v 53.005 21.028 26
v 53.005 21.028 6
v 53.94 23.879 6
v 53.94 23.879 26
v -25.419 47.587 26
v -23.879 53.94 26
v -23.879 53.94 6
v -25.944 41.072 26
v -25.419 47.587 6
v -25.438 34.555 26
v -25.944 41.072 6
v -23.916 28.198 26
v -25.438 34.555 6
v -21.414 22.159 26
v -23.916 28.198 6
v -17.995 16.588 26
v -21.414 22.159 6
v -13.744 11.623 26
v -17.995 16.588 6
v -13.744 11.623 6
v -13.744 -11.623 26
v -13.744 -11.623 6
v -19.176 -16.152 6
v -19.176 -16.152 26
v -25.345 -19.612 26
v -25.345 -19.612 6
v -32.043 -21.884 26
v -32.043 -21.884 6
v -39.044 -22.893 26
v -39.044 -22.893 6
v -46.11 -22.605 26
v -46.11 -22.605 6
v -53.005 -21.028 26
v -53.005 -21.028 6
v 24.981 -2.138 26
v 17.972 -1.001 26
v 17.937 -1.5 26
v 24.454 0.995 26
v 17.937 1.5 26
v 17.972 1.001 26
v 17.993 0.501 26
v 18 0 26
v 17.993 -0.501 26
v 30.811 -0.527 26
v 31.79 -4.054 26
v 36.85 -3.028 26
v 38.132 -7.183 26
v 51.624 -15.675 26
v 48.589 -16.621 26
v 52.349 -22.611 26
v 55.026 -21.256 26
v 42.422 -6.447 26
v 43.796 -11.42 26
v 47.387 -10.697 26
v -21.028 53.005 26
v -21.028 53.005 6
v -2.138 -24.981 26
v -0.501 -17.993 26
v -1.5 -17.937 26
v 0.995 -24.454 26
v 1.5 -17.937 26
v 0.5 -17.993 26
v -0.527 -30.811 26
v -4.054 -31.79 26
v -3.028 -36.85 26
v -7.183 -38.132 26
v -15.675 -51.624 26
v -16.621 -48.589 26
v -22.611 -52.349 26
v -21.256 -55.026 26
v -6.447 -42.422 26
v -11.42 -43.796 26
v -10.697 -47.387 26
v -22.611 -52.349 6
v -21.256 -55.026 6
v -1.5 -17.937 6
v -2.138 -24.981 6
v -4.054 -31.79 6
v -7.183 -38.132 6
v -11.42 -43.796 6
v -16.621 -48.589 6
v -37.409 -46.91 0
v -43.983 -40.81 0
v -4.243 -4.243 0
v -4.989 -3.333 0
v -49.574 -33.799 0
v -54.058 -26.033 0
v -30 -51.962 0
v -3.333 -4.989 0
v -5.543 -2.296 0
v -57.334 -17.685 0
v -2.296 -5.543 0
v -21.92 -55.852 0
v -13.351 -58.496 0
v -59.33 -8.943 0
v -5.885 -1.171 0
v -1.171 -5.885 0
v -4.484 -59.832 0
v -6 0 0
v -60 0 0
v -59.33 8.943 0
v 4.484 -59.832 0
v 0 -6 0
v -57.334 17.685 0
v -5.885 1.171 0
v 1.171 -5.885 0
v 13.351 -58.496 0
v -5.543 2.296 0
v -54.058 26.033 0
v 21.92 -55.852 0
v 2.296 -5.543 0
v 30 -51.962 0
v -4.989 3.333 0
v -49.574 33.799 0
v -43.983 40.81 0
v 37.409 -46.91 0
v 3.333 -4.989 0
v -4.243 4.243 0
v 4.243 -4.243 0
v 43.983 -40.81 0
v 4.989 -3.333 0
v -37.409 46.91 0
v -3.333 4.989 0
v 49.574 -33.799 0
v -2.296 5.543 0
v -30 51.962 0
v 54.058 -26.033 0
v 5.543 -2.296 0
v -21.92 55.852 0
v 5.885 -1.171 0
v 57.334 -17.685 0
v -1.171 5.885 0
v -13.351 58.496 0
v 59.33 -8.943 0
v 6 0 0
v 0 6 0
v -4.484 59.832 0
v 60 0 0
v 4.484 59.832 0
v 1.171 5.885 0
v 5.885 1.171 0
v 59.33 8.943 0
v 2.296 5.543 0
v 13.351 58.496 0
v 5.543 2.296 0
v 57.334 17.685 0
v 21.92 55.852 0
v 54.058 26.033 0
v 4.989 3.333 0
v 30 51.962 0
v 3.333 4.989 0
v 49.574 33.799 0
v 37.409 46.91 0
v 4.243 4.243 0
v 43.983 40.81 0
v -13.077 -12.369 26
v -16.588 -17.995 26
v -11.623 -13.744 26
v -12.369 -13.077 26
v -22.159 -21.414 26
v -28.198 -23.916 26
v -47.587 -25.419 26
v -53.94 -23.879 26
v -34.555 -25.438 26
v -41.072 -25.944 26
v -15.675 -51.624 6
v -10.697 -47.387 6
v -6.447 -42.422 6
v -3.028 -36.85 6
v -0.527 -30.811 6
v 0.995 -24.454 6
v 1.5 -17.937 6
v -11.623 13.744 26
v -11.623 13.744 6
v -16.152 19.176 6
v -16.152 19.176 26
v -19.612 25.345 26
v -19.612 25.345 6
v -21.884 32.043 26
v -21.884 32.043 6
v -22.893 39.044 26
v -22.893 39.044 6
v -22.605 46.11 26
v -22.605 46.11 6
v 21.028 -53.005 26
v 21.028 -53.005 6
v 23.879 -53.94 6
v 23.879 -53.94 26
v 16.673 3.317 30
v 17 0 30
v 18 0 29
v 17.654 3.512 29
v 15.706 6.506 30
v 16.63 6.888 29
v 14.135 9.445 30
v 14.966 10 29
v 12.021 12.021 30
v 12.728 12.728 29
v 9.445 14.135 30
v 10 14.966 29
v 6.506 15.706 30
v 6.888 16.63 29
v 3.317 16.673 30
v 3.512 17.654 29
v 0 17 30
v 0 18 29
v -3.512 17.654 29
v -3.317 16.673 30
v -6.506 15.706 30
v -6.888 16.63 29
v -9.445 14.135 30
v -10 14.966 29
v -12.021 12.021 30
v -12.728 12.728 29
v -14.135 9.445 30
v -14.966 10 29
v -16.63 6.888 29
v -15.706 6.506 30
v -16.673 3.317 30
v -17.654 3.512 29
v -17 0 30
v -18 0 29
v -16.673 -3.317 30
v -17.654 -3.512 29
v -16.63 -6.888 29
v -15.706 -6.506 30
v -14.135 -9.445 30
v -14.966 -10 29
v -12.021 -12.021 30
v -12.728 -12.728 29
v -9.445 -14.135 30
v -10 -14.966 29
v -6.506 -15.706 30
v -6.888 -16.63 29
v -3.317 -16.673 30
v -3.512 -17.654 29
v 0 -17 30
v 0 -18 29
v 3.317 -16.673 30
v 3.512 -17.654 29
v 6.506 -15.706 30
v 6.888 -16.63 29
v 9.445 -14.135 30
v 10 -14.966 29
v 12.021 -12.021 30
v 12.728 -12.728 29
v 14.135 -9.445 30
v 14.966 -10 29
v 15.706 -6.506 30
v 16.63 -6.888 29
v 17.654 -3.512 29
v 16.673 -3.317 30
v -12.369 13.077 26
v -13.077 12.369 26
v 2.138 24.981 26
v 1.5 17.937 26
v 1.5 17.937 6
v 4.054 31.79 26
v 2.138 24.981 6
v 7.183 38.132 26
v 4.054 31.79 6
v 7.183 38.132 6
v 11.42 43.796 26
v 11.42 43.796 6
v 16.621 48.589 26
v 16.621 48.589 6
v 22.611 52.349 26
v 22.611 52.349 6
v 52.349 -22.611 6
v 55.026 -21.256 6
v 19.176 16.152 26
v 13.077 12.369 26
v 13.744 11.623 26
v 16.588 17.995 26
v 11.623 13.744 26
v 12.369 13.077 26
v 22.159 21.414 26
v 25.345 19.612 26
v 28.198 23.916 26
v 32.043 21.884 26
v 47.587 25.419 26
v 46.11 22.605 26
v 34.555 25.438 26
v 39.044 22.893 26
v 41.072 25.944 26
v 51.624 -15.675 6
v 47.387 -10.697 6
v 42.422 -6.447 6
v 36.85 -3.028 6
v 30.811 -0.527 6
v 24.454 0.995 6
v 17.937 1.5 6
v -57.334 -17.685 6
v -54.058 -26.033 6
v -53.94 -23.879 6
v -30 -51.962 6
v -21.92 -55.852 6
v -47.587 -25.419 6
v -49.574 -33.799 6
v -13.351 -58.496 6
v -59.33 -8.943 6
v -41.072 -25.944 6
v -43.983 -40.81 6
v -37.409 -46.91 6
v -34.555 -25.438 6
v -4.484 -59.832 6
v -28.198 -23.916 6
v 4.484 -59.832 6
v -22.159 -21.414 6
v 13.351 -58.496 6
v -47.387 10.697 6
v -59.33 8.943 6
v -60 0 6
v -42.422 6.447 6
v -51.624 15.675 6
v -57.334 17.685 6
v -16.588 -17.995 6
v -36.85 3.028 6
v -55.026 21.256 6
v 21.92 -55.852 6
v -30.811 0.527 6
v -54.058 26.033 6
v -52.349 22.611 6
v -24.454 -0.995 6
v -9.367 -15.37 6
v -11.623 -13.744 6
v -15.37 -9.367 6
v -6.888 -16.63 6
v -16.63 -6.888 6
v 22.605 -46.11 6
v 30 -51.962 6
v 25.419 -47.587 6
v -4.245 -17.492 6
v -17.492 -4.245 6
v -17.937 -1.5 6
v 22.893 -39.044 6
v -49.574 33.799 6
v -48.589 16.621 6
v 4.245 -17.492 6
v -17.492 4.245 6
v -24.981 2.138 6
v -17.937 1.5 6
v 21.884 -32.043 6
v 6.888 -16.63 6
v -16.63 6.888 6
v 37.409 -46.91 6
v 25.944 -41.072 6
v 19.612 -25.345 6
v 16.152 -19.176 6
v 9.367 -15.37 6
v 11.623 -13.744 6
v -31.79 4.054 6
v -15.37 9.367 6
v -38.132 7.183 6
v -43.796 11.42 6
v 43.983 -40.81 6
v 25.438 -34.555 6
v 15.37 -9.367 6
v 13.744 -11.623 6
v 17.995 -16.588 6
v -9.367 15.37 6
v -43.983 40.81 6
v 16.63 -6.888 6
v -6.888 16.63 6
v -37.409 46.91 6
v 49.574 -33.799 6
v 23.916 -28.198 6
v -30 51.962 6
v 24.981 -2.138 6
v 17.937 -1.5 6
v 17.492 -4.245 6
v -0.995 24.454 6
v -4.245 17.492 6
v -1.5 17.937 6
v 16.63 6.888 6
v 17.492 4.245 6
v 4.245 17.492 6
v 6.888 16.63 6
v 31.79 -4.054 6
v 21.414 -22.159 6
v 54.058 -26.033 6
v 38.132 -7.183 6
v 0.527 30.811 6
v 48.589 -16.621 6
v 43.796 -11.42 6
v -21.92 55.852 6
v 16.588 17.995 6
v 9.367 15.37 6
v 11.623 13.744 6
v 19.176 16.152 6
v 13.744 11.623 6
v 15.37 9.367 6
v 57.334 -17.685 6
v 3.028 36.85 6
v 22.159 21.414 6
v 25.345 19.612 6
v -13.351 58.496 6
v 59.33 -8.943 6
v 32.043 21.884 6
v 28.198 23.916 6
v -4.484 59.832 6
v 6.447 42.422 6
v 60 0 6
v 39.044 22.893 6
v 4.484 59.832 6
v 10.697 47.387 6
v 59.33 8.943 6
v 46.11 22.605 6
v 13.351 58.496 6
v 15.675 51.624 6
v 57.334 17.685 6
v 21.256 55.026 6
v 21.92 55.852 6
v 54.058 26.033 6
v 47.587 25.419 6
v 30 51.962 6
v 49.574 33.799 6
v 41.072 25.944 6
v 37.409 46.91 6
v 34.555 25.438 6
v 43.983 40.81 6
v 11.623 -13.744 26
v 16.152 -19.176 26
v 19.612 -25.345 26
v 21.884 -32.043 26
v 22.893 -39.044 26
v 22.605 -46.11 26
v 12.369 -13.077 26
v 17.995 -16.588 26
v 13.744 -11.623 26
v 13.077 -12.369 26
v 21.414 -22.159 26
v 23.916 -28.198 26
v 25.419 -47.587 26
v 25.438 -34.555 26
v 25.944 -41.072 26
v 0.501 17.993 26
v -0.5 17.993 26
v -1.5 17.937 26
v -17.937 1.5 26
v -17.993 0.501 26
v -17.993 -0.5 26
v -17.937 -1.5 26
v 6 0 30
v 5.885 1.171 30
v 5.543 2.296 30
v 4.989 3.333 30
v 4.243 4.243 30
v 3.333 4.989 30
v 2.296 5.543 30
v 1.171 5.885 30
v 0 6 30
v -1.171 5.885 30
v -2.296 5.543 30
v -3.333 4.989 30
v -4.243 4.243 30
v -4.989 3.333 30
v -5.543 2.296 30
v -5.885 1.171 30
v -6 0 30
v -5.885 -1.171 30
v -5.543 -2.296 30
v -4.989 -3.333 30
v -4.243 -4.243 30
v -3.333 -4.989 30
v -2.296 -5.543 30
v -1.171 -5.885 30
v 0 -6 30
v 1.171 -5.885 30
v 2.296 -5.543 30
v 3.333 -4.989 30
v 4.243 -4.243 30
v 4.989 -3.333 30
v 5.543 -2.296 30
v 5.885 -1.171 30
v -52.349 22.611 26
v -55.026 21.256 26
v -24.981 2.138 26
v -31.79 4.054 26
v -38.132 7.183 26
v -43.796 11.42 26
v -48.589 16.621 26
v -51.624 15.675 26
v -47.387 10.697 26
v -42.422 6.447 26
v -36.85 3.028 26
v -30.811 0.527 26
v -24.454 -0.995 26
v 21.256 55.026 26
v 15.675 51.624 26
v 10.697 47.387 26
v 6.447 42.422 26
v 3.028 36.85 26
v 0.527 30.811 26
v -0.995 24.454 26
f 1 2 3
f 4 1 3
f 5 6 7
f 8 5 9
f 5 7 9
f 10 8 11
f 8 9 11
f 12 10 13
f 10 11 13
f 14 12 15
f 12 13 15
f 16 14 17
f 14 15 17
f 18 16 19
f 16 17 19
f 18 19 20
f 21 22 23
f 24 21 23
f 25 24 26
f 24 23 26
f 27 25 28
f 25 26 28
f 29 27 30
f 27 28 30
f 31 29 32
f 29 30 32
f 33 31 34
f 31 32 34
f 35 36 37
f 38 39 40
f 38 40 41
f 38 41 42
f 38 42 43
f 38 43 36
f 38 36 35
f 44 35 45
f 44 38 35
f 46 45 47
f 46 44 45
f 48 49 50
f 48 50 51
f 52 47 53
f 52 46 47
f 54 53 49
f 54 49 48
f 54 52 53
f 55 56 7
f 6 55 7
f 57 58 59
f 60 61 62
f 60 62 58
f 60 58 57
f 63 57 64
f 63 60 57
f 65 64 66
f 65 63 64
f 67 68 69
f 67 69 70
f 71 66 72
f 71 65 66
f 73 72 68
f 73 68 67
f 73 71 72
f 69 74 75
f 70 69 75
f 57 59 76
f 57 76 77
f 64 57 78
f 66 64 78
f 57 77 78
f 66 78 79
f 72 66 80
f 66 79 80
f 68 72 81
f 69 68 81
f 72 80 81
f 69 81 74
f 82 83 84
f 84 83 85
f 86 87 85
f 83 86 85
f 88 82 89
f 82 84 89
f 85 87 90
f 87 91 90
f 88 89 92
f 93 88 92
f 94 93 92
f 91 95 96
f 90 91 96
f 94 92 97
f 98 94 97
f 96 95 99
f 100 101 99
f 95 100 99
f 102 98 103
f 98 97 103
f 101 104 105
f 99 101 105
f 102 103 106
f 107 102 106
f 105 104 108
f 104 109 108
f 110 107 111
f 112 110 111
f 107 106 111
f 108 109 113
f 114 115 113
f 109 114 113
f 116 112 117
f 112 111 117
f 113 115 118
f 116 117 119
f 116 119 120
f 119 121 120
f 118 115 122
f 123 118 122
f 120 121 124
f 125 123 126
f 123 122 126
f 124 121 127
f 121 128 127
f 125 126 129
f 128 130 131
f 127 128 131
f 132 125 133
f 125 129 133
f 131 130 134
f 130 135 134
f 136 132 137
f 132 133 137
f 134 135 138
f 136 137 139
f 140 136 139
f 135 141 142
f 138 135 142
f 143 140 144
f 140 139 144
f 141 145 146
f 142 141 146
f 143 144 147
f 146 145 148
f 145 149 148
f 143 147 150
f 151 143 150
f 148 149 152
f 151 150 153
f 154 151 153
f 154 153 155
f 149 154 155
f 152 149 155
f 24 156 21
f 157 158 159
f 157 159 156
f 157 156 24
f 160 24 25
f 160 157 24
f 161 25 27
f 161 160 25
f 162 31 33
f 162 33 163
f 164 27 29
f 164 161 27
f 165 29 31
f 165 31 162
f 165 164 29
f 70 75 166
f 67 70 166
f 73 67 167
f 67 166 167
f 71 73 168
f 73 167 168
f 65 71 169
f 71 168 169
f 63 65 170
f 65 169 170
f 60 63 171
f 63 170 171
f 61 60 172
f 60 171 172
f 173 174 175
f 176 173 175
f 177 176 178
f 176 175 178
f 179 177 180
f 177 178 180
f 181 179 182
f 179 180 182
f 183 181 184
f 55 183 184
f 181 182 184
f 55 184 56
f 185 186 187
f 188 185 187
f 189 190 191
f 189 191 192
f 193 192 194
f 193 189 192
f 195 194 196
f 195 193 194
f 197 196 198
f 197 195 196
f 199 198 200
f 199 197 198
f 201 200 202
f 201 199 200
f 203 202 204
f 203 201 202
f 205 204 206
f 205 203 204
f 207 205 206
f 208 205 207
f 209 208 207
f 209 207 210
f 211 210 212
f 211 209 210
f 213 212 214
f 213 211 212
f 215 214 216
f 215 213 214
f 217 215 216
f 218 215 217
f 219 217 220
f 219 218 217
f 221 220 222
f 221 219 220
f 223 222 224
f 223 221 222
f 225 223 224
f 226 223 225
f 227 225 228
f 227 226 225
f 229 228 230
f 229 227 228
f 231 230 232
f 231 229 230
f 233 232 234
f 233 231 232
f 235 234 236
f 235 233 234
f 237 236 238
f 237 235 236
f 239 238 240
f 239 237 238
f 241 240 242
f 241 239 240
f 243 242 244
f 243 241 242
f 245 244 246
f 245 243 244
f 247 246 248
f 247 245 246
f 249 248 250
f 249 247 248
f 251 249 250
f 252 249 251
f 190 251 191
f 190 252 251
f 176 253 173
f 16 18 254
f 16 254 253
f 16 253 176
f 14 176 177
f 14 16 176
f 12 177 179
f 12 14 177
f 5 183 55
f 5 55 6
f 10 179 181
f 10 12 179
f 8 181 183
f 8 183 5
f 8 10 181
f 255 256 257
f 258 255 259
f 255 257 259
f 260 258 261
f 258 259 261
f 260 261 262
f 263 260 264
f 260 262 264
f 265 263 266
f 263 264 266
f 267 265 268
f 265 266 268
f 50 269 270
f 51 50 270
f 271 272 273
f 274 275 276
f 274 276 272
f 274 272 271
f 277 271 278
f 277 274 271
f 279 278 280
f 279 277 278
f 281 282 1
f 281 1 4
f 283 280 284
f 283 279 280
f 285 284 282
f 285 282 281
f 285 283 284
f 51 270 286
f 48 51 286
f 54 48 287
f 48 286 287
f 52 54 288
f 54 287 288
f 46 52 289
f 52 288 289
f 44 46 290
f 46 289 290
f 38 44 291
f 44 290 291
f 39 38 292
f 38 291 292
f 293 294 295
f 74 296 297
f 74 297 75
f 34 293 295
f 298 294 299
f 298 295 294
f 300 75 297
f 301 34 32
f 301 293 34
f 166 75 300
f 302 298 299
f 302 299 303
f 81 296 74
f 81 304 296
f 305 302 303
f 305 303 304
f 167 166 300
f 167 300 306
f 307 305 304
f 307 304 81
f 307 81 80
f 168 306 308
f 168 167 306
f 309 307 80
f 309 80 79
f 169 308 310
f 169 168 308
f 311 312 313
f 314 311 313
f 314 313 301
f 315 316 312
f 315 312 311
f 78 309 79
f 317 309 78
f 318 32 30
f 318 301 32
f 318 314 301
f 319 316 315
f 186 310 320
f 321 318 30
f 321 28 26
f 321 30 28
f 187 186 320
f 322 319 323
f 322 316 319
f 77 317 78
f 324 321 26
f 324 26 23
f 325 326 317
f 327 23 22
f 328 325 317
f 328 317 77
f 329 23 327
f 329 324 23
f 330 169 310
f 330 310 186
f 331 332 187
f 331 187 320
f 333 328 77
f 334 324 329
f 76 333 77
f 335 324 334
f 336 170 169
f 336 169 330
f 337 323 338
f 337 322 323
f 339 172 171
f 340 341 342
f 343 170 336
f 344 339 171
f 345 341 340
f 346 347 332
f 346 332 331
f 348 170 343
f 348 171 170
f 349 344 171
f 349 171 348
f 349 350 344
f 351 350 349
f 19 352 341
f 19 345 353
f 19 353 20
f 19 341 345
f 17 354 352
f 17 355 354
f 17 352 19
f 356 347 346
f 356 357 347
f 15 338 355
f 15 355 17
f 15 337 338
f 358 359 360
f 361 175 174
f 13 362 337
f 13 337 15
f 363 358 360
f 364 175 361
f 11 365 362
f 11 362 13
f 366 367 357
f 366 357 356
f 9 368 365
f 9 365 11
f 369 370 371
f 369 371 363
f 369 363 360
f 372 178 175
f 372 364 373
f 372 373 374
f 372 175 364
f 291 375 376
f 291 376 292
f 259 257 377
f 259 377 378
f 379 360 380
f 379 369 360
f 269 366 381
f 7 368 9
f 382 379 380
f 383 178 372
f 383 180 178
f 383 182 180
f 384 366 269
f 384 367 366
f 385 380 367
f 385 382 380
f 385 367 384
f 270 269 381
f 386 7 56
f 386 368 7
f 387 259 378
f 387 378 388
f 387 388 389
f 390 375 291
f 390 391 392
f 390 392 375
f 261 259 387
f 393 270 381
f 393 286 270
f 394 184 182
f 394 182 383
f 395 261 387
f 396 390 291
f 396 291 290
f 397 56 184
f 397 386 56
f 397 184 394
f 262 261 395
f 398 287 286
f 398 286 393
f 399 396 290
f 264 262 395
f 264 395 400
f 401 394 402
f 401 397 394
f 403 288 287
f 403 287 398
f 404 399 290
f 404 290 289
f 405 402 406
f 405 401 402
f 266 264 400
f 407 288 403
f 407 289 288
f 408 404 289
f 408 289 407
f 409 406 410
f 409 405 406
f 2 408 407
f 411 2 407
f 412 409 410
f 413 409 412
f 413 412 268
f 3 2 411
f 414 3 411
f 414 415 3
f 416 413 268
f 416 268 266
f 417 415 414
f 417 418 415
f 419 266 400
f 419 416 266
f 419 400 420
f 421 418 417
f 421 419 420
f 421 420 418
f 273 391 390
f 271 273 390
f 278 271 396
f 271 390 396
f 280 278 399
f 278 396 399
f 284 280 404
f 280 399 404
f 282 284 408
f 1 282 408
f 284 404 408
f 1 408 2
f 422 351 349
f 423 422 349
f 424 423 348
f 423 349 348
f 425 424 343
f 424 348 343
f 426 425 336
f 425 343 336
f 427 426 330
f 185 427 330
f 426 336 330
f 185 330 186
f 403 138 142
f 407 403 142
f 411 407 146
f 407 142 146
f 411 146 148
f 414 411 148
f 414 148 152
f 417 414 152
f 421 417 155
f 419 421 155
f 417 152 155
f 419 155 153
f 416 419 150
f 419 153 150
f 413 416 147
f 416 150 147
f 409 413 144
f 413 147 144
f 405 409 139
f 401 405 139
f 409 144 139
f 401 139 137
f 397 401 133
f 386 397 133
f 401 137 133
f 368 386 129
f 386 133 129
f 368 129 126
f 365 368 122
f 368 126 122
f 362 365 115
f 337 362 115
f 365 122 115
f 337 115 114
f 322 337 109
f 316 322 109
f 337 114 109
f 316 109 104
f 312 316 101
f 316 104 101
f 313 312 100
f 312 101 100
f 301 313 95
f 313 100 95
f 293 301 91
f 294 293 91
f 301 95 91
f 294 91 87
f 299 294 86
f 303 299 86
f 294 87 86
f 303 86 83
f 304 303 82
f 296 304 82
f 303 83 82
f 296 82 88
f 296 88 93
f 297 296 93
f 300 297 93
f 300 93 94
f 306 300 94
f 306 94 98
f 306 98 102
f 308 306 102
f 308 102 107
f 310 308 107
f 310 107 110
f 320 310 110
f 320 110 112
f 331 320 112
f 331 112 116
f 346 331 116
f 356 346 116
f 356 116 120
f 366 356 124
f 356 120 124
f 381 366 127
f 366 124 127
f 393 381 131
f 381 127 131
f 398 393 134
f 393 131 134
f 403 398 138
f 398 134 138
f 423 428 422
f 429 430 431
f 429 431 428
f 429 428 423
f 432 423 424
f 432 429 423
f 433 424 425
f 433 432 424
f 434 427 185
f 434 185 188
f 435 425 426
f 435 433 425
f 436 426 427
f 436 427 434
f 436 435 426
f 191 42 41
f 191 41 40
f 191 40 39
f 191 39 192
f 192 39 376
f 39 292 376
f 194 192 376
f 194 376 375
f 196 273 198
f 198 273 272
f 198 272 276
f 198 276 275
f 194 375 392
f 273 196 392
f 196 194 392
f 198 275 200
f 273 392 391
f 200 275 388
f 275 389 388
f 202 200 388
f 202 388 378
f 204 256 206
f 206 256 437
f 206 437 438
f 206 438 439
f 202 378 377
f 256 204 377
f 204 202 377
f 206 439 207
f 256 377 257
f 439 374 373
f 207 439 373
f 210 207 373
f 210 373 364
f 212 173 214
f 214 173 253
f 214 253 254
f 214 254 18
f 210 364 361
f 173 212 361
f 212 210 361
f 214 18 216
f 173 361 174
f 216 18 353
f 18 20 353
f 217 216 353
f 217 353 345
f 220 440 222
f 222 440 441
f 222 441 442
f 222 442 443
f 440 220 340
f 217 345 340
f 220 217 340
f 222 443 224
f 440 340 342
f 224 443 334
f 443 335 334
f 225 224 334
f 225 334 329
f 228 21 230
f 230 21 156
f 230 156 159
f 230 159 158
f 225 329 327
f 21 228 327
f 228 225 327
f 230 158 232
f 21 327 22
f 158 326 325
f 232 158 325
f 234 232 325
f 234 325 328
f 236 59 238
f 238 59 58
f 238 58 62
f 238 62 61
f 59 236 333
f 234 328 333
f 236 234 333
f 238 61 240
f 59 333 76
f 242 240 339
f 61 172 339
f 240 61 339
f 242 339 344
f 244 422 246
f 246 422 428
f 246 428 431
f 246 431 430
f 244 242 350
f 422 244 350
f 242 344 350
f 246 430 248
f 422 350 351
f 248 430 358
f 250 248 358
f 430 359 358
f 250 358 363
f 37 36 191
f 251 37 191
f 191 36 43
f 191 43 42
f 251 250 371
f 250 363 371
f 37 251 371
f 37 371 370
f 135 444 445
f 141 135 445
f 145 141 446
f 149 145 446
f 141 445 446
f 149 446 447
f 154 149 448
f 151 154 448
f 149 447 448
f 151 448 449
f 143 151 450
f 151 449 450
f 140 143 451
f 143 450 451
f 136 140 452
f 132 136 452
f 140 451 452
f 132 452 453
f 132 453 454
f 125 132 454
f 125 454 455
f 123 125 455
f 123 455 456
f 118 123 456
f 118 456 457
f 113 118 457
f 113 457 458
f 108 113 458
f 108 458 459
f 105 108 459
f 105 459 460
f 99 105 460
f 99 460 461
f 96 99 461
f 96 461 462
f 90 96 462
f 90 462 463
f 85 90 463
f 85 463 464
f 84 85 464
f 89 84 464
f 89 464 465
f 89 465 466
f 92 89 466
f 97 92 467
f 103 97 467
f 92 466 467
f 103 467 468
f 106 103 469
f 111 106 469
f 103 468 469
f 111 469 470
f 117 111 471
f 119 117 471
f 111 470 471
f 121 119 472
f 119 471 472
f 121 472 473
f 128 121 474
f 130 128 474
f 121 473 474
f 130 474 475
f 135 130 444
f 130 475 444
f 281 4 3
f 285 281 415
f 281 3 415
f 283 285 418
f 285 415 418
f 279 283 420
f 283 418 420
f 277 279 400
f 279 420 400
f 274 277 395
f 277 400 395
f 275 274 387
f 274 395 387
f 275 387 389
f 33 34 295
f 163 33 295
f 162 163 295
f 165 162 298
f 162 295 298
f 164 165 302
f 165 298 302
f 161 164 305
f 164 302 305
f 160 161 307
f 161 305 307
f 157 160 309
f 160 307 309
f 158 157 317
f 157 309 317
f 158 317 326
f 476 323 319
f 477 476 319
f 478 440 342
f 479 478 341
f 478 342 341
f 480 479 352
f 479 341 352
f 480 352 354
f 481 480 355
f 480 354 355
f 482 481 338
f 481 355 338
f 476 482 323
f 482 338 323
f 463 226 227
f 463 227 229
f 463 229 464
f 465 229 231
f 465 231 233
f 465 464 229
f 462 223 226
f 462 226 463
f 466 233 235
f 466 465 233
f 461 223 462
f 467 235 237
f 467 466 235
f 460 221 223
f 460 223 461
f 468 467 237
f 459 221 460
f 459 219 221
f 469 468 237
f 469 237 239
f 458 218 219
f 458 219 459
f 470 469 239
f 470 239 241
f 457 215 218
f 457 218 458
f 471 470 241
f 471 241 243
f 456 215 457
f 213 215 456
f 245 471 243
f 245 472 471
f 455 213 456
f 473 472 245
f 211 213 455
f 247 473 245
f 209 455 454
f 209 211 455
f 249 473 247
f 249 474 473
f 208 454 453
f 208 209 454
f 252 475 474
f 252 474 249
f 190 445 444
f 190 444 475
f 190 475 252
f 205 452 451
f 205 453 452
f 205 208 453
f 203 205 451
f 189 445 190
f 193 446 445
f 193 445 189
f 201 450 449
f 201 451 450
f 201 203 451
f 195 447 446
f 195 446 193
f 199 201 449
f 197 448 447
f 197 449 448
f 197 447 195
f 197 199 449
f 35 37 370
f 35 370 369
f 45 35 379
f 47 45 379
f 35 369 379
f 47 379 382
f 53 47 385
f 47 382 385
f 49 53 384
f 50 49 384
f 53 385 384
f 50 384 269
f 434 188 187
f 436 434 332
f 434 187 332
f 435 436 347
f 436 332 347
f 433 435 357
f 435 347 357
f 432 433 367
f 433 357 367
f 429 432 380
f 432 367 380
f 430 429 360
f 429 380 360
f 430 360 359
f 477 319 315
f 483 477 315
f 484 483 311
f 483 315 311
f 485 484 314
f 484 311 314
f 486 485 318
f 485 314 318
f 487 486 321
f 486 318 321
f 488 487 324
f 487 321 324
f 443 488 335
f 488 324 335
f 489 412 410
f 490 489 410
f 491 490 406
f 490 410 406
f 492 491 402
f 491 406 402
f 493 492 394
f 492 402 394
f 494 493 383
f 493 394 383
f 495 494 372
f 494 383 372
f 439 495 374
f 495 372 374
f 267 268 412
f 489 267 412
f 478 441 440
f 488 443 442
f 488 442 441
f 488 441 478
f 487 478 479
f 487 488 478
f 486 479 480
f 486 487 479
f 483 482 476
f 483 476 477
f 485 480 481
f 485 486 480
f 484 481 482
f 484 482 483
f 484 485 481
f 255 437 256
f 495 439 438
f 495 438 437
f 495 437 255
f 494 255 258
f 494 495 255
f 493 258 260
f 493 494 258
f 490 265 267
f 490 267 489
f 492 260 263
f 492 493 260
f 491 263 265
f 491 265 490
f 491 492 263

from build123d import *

# Parameters (mm, degrees)
SKETCH_1_R               = 60
EXTRUDE_1_DEPTH          = 6
SKETCH_2_R               = 18
EXTRUDE_2_DEPTH          = 30
EXTRUDE_3_DEPTH          = 20
PATTERN_CIRCULAR_1_COUNT = 8
SKETCH_4_R               = 6
CUT_EXTRUDE_1_DEPTH      = 91
CHAMFER_1_SIZE           = 1


with BuildPart() as part:
    # 草图1 → 凸台-拉伸1 (new body)
    with BuildSketch(Plane.XY):
        Circle(SKETCH_1_R)
    extrude(amount=EXTRUDE_1_DEPTH)

    # 草图2 → 凸台-拉伸2 (add)
    with BuildSketch(Plane.XY):
        Circle(SKETCH_2_R)
    extrude(amount=EXTRUDE_2_DEPTH)

    # 草图3 → 凸台-拉伸3 (add)
    with BuildSketch(Plane.XY.offset(6)):
        with BuildLine():
            Line((10.793600627, 0.86952175), (11.31454516, -2.084901509))
            ThreePointArc((11.31454516, -2.084901509), (35.223702528, -5.567543346), (52.349392529, -22.611232566))
            Line((52.349392529, -22.611232566), (55.025968571, -21.256263675))
            ThreePointArc((55.025968571, -21.256263675), (36.565809219, -2.884494776), (10.793600627, 0.86952175))
        make_face()
    extrude_3 = extrude(amount=EXTRUDE_3_DEPTH)

    # 阵列(圆周)1: 凸台-拉伸3 ×8 about axis
    pattern_circular_1_axis = Axis((0, 0, 31.5), (0, 0, -1))
    for i in range(1, PATTERN_CIRCULAR_1_COUNT):
        add(extrude_3.rotate(pattern_circular_1_axis, i * 360 / PATTERN_CIRCULAR_1_COUNT))

    # 草图4 → 切除-拉伸1 (cut, through all)
    with BuildSketch(Plane.XY.offset(30)):
        Circle(SKETCH_4_R)
    extrude(amount=-CUT_EXTRUDE_1_DEPTH, mode=Mode.SUBTRACT)

    # 倒角1
    chamfer_1_edges = [part.edges().sort_by_distance(p)[0] for p in [
        (-18, 0, 30),
    ]]
    chamfer(chamfer_1_edges, length=CHAMFER_1_SIZE)


solid = part.part
